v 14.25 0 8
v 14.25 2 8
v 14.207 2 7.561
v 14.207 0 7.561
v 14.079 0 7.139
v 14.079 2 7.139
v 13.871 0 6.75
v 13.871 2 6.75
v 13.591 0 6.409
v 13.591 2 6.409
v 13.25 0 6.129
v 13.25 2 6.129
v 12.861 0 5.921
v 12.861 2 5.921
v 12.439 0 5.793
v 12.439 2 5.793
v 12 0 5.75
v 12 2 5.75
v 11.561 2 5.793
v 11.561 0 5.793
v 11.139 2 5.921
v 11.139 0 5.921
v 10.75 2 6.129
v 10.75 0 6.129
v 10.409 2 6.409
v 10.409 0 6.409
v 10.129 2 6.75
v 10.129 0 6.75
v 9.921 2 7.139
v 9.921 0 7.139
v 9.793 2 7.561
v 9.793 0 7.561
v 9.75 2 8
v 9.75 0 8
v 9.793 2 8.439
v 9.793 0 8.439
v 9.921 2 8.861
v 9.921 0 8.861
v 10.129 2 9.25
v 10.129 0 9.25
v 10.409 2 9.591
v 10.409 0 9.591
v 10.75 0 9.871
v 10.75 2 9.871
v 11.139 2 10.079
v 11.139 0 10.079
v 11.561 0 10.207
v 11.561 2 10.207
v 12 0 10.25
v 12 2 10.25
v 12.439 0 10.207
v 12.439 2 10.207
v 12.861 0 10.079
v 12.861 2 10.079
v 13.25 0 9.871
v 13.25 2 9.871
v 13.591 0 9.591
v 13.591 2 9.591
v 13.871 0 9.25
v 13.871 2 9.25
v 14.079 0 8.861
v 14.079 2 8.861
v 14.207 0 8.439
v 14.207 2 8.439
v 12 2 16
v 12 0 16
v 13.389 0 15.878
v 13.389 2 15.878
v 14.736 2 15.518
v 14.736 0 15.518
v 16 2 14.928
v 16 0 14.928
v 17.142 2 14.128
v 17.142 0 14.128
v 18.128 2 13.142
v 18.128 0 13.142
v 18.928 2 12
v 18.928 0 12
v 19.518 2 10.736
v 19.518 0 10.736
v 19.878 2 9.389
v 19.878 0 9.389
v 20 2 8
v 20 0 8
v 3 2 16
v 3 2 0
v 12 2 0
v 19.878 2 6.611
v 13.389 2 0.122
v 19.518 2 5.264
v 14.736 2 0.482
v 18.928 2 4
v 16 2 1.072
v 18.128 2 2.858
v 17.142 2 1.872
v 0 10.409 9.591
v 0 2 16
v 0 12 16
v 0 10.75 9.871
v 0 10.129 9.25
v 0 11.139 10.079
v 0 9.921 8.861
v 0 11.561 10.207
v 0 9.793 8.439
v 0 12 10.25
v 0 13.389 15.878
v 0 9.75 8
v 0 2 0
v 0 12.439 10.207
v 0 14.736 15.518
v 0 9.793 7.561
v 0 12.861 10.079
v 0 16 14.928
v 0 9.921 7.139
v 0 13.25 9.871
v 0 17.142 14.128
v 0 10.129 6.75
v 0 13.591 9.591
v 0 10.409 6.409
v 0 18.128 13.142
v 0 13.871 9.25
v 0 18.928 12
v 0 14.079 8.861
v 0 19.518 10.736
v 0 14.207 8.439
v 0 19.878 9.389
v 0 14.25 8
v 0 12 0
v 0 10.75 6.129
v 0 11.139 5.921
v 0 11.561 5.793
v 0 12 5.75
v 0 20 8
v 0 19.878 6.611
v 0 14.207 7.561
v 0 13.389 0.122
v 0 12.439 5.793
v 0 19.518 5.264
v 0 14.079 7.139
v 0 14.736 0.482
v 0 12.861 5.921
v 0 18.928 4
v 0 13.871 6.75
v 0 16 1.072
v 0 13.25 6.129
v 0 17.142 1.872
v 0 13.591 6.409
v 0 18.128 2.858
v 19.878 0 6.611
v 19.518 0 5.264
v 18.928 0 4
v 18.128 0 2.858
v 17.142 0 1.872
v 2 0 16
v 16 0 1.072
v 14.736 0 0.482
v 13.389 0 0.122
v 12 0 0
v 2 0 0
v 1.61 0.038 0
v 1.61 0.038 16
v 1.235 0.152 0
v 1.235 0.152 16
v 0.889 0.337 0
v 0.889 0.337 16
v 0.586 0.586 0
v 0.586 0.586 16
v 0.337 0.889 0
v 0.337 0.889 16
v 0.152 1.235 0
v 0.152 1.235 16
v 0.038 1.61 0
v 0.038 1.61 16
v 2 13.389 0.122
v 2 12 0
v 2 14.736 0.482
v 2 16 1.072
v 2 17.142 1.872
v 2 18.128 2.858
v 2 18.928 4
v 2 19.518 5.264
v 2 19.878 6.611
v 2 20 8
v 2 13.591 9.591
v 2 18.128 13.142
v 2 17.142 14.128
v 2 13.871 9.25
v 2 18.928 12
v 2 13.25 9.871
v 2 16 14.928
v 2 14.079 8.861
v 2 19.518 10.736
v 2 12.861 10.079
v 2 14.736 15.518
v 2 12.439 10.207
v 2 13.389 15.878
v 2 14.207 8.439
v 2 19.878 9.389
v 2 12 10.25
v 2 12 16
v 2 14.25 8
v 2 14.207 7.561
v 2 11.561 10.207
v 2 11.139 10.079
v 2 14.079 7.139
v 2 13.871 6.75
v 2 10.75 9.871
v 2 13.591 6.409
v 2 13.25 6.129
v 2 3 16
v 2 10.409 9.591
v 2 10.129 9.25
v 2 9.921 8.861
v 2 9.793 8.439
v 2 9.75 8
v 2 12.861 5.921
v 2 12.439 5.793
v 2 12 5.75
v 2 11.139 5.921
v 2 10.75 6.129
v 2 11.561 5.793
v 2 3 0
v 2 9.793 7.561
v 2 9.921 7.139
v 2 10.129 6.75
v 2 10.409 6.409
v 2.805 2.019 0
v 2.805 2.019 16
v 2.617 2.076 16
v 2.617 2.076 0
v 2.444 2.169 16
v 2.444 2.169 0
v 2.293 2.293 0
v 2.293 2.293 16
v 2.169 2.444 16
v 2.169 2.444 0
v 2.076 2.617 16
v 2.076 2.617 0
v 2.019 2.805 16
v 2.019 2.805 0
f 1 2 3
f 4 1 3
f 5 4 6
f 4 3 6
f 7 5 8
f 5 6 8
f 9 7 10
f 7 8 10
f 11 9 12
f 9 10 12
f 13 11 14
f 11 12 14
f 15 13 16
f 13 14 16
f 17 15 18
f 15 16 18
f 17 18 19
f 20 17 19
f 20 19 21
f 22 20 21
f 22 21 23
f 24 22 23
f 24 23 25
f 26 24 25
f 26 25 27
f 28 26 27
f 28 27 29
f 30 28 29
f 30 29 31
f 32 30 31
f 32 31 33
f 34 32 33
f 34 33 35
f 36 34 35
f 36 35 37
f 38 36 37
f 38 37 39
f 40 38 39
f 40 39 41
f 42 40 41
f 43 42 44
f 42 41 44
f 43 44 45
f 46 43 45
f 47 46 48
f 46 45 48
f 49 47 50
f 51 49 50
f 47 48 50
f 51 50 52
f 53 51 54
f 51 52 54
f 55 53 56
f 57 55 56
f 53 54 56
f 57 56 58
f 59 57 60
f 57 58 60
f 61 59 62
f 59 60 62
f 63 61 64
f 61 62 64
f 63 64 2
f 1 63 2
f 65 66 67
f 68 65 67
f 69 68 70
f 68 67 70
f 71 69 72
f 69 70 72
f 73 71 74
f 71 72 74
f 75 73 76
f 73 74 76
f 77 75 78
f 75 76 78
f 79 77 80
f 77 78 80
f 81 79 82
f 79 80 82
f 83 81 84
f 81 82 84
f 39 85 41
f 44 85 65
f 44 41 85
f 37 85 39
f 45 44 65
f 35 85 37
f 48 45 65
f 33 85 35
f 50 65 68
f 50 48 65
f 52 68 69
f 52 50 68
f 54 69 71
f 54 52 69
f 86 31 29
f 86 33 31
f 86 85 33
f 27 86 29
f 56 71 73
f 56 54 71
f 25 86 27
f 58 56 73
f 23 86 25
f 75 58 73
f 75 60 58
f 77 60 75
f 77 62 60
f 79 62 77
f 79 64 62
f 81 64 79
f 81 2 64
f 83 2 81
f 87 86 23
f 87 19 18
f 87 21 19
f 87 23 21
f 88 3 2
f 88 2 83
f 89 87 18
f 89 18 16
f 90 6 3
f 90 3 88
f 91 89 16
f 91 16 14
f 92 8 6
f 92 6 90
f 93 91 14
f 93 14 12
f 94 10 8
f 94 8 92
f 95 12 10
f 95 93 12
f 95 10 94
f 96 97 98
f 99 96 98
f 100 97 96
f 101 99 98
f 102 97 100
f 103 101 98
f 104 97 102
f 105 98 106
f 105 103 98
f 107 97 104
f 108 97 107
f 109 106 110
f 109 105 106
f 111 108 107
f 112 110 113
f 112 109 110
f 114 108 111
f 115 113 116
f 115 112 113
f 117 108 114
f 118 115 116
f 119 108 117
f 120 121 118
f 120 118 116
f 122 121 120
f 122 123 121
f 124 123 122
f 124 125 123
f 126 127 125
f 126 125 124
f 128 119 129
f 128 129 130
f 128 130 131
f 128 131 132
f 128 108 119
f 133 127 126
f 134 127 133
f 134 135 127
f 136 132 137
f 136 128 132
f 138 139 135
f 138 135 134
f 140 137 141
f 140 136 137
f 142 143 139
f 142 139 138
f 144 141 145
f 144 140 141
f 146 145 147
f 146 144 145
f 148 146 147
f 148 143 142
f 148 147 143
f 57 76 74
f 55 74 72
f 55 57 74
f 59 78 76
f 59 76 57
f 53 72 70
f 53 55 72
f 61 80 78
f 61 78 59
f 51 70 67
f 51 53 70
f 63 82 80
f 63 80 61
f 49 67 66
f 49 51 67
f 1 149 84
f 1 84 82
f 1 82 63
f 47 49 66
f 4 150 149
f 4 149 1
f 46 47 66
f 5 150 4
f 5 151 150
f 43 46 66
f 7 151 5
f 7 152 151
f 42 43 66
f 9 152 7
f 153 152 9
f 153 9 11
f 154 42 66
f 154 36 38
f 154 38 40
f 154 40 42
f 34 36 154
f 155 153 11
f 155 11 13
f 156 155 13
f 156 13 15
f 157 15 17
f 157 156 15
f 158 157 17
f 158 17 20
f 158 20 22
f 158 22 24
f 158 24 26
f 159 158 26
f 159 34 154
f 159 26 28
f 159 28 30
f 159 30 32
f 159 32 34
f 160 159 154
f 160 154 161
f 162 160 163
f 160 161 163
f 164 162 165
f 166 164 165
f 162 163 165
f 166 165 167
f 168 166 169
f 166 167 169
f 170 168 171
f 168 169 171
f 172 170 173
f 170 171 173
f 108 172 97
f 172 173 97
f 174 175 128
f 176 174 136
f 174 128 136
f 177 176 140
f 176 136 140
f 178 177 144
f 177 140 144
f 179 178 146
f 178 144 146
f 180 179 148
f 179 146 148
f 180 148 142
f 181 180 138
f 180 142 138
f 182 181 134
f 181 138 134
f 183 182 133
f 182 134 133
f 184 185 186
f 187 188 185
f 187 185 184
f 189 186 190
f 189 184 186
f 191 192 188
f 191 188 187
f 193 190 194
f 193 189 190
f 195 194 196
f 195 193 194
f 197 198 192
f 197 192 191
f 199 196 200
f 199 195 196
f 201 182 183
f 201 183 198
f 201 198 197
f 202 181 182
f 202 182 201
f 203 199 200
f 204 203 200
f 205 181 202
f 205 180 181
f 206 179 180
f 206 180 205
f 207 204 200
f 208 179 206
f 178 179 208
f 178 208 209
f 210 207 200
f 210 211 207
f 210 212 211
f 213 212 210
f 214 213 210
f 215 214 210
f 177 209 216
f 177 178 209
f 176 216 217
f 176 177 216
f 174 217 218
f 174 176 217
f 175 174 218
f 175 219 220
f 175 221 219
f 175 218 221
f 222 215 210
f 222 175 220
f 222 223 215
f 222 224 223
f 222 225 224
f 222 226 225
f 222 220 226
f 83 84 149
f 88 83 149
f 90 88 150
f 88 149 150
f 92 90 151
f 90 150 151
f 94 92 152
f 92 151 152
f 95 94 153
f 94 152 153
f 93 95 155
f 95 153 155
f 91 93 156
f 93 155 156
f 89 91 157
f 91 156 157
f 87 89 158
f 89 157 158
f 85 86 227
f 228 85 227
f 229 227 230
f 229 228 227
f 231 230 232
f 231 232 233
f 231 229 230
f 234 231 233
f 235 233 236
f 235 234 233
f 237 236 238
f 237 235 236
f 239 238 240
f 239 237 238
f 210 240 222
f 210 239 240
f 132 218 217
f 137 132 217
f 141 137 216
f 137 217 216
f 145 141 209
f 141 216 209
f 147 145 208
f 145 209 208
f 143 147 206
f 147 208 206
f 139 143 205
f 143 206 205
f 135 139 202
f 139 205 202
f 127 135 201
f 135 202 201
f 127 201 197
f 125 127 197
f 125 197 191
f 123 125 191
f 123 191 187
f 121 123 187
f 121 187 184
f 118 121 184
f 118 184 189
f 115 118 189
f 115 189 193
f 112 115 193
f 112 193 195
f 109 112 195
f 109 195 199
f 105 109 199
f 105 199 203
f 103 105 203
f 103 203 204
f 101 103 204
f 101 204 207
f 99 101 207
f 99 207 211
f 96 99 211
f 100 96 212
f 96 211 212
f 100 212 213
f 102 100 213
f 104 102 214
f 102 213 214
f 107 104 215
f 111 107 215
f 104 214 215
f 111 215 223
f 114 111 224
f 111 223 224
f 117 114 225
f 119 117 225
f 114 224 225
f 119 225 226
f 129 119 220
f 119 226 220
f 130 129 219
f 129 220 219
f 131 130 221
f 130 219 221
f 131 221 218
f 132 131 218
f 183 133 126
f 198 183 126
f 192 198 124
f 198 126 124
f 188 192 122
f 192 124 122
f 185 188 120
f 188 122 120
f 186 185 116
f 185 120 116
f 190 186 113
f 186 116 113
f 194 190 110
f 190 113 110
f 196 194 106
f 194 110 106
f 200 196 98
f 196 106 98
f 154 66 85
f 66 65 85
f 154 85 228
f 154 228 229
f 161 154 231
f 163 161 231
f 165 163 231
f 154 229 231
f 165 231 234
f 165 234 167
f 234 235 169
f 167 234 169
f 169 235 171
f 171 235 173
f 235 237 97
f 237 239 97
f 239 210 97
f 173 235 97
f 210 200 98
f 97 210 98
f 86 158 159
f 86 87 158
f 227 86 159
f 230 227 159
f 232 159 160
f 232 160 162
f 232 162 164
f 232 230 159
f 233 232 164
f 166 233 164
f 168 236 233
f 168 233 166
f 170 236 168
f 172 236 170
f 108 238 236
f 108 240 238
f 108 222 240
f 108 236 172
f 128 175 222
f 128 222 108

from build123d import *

# Parameters (mm, degrees)
EXTRUDE_1_DEPTH     = 16
CUT_EXTRUDE_1_DEPTH = 21
CUT_EXTRUDE_2_DEPTH = 21
FILLET_1_R          = 1
FILLET_2_R          = 2
SKETCH_4_R          = 2.25
CUT_EXTRUDE_3_DEPTH = 3
SKETCH_5_R          = 2.25
CUT_EXTRUDE_4_DEPTH = 3


with BuildPart() as part:
    # Sketch 1 → Бобышка-Вытянуть1 (new body)
    with BuildSketch(Plane.XY):
        Polygon((0, 0), (0, 20), (2, 20), (2, 2), (20, 2), (20, 0), align=None)
    extrude(amount=EXTRUDE_1_DEPTH)

    # Эскиз2 → Вырез-Вытянуть1 (cut, through all)
    with BuildSketch(Plane.XZ):
        with BuildLine():
            Line((20, 0), (20, 8.000000031))
            ThreePointArc((20, 8.000000031), (17.656854261, 2.343145762), (12, 0))
            Line((12, 0), (20, 0))
        make_face()
        with BuildLine():
            Line((20, 16), (12, 16))
            ThreePointArc((12, 16), (17.656854238, 13.656854261), (20, 8.000000031))
            Line((20, 8.000000031), (20, 16))
        make_face()
    extrude(amount=-CUT_EXTRUDE_1_DEPTH, mode=Mode.SUBTRACT)

    # Эскиз3 → Вырез-Вытянуть2 (cut, through all)
    with BuildSketch(Plane.ZY):
        with BuildLine():
            Line((8, 20), (0, 20))
            Line((0, 20), (0, 12))
            ThreePointArc((0, 12), (2.343145751, 17.656854249), (8, 20))
        make_face()
        with BuildLine():
            Line((16, 20), (8, 20))
            ThreePointArc((8, 20), (13.656854249, 17.656854249), (16, 12))
            Line((16, 12), (16, 20))
        make_face()
    extrude(amount=-CUT_EXTRUDE_2_DEPTH, mode=Mode.SUBTRACT)

    # Скругление1
    fillet_1_edges = [part.edges().sort_by_distance(p)[0] for p in [
        (2, 2, 8),
    ]]
    fillet(fillet_1_edges, radius=FILLET_1_R)

    # Скругление2
    fillet_2_edges = [part.edges().sort_by_distance(p)[0] for p in [
        (0, 0, 8),
    ]]
    fillet(fillet_2_edges, radius=FILLET_2_R)

    # Эскиз4 → Вырез-Вытянуть3 (cut, through all)
    with BuildSketch(Plane(origin=(2, 0, 0), x_dir=(0, 0, -1), z_dir=(1, 0, 0))):
        with Locations((-8, 12)):
            Circle(SKETCH_4_R)
    extrude(amount=-CUT_EXTRUDE_3_DEPTH, mode=Mode.SUBTRACT)

    # Эскиз5 → Вырез-Вытянуть4 (cut, through all)
    with BuildSketch(Plane(origin=(0, 2, 0), x_dir=(1, 0, 0), z_dir=(0, 1, 0))):
        with Locations((12, -8)):
            Circle(SKETCH_5_R)
    extrude(amount=-CUT_EXTRUDE_4_DEPTH, mode=Mode.SUBTRACT)


solid = part.part
